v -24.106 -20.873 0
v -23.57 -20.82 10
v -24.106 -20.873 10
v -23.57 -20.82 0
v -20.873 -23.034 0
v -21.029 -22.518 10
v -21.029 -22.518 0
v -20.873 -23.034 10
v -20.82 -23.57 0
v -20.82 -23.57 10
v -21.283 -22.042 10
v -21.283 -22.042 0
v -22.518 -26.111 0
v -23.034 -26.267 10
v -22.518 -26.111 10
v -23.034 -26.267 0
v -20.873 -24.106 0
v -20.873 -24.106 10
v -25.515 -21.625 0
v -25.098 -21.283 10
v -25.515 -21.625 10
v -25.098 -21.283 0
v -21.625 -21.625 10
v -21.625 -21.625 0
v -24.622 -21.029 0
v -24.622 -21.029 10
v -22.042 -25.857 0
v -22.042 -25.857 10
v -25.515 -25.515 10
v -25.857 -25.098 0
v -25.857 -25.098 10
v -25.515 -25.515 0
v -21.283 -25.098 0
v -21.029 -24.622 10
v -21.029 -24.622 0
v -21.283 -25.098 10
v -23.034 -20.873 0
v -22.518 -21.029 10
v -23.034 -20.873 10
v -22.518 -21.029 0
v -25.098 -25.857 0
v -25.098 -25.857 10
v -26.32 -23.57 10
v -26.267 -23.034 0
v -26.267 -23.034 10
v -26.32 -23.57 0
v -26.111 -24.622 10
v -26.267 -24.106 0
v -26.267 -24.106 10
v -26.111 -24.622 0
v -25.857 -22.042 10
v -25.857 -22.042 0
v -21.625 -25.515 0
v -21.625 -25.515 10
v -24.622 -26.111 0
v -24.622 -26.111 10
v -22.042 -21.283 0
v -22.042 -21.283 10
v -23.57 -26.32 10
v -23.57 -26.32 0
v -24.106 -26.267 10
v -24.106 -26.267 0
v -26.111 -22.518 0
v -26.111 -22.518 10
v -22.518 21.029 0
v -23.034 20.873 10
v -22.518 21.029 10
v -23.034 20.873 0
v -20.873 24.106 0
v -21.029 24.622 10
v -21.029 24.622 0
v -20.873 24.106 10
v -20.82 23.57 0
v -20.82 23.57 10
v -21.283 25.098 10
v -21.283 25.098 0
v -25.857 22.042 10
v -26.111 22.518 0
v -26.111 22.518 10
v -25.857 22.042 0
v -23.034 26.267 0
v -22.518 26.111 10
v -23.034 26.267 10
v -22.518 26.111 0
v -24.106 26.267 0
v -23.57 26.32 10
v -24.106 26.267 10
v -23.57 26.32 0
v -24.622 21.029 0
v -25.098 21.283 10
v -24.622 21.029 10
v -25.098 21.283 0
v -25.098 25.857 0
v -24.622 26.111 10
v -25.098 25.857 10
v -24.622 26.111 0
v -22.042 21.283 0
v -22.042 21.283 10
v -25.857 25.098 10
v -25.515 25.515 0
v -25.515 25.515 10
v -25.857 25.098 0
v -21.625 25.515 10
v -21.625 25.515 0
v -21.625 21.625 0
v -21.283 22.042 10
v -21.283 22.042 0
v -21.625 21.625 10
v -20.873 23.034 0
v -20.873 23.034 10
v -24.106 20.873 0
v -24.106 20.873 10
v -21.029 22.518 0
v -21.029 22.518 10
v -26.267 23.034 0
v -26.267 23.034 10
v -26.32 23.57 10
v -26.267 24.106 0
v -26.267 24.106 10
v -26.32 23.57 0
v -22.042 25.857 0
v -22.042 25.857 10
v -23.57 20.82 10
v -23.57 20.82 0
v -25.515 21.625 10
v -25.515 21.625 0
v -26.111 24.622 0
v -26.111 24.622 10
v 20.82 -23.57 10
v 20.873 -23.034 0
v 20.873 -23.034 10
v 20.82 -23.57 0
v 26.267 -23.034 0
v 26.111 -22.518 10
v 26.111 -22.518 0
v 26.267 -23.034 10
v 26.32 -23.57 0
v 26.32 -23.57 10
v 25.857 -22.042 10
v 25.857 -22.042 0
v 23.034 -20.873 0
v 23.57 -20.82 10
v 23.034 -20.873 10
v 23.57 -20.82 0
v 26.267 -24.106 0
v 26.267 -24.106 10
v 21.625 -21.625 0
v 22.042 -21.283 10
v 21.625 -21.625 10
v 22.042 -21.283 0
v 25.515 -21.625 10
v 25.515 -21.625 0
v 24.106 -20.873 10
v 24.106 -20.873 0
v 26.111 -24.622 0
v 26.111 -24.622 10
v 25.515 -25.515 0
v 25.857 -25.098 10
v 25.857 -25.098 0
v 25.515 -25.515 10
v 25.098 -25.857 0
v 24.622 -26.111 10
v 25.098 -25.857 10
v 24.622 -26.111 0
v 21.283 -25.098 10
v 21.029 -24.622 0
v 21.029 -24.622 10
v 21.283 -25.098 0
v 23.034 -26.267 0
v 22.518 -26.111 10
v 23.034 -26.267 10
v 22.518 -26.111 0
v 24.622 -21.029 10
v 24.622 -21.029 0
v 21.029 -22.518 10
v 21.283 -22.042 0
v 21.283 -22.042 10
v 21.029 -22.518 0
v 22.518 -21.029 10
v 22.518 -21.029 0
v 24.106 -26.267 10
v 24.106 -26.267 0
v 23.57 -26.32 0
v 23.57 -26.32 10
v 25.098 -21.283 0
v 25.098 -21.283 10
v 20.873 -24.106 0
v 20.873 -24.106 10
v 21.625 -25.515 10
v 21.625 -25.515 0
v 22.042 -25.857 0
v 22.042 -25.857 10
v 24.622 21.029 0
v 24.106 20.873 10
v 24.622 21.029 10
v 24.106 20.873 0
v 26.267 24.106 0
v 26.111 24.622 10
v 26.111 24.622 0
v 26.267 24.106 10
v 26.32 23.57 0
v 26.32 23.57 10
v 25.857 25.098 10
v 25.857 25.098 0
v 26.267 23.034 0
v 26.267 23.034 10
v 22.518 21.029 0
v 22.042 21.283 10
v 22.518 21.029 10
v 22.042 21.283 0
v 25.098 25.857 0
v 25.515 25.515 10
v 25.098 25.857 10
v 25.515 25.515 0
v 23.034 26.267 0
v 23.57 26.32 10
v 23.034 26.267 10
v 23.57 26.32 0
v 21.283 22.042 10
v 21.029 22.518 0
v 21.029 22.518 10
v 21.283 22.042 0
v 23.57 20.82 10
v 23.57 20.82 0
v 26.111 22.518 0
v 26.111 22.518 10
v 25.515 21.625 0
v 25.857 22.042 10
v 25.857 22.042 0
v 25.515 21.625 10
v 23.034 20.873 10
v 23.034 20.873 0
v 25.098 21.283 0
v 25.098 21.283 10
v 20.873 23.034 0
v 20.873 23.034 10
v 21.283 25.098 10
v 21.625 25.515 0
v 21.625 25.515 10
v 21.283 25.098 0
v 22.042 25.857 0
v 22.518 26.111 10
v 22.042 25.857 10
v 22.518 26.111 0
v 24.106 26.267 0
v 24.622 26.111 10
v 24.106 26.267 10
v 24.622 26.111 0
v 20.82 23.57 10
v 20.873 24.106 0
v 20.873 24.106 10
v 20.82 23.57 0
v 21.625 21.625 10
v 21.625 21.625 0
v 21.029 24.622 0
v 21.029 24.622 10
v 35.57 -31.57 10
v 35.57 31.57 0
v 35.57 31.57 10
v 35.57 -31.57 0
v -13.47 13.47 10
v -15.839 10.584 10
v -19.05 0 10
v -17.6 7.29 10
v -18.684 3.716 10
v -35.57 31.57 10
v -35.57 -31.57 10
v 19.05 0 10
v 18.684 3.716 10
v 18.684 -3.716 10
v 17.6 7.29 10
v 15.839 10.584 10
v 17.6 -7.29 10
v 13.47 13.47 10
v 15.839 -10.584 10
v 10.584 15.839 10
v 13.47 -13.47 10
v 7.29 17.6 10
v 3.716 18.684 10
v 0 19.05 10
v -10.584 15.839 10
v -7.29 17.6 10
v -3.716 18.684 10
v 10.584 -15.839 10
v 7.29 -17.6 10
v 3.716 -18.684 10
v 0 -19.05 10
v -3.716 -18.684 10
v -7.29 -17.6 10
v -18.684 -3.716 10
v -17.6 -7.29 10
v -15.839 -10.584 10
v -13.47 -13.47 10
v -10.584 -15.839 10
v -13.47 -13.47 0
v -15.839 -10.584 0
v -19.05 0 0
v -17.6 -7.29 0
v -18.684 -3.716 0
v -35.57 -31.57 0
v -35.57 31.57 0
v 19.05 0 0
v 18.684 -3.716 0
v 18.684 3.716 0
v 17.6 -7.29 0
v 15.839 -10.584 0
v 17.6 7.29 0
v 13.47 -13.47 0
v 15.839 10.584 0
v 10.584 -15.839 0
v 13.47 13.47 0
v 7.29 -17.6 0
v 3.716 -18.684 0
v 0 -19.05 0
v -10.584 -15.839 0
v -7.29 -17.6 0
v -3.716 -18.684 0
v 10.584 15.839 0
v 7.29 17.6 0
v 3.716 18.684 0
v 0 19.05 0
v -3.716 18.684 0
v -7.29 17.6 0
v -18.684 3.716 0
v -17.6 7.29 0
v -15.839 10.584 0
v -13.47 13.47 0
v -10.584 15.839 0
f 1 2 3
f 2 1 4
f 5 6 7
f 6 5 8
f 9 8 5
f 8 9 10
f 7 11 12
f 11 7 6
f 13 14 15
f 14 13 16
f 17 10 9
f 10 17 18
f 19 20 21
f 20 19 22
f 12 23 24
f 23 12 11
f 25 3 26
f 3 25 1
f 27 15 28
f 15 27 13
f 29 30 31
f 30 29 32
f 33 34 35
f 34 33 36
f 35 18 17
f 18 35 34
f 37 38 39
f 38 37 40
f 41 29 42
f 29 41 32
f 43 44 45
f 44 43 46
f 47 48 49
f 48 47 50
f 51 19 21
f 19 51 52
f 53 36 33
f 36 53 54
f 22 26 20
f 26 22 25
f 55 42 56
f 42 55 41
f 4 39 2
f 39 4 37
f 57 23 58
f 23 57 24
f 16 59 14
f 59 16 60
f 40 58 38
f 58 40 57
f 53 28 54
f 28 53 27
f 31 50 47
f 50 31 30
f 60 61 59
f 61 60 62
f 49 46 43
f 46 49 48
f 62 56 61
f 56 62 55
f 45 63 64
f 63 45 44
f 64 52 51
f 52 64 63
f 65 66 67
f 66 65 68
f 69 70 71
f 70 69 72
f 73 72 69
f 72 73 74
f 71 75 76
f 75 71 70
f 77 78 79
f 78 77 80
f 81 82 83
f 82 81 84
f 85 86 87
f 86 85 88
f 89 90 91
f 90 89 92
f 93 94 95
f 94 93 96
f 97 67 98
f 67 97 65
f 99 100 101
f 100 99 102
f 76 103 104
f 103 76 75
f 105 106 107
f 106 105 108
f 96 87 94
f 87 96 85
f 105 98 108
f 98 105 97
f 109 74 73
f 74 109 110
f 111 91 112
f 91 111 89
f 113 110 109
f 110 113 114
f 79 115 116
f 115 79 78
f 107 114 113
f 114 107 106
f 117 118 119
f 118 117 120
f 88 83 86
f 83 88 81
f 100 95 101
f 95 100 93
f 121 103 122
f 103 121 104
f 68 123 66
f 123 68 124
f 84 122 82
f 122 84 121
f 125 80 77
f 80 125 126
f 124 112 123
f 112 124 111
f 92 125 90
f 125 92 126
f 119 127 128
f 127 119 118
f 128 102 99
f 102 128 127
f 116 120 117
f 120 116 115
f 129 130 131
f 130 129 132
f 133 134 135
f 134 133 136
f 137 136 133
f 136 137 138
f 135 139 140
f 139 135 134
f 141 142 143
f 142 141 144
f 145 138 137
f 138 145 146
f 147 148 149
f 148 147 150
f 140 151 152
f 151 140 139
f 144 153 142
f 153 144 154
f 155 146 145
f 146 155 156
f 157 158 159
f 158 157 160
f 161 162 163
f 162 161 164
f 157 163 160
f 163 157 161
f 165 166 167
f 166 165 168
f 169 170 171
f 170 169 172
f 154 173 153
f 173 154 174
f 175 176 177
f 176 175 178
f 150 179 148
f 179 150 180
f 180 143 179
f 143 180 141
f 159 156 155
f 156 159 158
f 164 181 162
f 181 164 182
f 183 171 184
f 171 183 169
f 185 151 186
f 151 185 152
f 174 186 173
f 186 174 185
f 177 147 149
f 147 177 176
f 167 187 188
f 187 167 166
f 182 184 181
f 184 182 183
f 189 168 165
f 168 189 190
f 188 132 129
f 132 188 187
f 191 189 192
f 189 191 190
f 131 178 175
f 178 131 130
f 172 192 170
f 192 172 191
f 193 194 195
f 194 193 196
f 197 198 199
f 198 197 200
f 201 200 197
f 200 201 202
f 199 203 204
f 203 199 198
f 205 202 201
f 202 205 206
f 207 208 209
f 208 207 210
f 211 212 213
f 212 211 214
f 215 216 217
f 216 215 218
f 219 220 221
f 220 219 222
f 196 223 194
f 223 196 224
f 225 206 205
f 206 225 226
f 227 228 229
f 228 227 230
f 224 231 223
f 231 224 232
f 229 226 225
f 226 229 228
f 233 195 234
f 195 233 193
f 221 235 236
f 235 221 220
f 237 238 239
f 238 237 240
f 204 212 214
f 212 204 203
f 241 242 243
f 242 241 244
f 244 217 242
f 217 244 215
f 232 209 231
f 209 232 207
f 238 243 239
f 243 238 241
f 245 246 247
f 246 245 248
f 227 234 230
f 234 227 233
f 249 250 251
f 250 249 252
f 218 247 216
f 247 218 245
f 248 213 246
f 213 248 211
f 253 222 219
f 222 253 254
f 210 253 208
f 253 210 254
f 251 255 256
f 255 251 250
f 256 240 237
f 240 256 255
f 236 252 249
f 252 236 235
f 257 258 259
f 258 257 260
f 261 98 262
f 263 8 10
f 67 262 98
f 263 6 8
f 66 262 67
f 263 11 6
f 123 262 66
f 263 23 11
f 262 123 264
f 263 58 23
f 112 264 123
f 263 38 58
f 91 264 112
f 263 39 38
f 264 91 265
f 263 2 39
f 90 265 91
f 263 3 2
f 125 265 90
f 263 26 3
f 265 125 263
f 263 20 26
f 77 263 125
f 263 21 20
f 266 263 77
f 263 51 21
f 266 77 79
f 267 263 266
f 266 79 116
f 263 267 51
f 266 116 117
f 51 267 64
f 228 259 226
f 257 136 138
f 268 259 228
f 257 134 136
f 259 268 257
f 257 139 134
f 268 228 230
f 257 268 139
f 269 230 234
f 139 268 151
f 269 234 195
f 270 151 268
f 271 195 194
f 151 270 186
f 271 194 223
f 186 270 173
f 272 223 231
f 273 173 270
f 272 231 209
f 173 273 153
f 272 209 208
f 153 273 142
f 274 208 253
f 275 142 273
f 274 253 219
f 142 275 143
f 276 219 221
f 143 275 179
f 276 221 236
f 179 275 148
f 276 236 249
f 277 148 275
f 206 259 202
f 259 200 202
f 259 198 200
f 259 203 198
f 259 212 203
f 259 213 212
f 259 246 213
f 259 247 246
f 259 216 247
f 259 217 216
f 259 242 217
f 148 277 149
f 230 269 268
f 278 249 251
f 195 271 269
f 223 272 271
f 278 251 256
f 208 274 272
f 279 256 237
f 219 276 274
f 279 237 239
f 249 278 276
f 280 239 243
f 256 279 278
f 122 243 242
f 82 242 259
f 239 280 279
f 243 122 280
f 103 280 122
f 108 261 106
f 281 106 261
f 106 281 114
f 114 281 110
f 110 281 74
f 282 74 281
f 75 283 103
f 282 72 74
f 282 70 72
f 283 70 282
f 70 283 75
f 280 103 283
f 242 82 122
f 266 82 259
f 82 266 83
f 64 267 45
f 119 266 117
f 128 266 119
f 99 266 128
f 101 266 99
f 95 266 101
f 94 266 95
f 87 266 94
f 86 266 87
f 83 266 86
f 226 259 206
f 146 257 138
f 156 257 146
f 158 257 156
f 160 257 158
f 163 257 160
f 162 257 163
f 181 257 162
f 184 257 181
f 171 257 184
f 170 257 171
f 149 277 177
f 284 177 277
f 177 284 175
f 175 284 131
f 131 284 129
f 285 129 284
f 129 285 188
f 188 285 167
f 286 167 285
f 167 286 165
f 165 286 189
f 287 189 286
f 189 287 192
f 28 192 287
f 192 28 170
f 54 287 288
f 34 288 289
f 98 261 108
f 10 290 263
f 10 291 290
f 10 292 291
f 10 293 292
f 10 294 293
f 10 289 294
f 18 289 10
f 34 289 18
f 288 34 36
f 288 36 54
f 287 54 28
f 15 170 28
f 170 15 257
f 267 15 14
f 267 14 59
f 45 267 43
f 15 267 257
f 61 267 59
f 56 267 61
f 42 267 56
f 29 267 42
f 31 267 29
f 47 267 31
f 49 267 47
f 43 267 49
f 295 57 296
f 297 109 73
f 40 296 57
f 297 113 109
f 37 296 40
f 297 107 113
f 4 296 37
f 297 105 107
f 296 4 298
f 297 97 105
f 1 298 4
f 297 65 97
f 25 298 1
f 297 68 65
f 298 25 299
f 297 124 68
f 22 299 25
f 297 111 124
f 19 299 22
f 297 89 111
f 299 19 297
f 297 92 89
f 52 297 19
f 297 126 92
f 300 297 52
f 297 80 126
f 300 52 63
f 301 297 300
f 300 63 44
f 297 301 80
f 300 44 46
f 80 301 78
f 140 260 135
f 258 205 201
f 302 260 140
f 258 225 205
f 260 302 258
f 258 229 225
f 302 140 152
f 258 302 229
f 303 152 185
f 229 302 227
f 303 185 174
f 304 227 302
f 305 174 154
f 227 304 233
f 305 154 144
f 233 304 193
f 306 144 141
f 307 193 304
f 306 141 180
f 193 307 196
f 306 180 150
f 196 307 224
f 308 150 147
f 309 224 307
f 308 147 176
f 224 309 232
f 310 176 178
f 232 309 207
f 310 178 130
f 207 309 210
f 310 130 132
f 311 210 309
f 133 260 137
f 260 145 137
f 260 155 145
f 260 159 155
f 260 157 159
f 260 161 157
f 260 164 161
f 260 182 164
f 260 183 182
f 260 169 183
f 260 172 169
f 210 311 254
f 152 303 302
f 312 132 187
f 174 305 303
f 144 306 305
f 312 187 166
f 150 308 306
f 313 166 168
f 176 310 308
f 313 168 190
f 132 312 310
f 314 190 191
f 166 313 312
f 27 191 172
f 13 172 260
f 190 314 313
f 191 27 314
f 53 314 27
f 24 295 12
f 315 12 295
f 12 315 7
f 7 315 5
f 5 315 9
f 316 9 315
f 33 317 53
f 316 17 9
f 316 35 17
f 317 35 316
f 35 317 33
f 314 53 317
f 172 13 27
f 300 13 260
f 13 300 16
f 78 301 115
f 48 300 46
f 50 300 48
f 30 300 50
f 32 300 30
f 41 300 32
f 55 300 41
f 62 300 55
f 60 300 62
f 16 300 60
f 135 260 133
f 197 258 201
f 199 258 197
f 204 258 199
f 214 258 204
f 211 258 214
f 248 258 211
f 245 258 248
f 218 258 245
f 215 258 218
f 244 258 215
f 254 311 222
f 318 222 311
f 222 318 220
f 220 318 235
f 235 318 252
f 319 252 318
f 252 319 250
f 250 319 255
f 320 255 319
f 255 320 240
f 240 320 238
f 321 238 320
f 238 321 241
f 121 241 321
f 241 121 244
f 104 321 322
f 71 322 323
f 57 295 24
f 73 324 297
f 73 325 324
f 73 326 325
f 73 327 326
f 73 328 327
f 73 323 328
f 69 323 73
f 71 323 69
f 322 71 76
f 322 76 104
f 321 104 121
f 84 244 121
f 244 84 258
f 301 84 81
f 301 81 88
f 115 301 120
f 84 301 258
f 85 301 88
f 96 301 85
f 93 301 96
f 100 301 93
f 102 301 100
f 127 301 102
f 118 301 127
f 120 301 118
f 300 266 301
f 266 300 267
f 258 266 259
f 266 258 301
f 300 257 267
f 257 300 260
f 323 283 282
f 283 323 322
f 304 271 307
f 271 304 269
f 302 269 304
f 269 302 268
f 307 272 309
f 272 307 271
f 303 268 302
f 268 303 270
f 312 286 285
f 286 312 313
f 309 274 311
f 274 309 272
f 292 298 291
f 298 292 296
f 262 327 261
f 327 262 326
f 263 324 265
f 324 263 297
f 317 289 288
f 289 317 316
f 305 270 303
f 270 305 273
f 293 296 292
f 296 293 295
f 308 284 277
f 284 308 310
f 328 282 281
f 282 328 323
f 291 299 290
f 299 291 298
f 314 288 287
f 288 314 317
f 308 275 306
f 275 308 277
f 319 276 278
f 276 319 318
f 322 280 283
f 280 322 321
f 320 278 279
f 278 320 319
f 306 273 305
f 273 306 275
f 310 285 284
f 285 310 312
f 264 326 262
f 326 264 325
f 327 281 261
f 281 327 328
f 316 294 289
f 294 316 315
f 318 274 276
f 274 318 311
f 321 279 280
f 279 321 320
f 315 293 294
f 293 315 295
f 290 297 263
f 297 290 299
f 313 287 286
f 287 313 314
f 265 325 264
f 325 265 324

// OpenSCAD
$fn = 32;

// ----------------------------------------------------------------------
// Motor mount plate: NEMA23, 71.14 x 63.14 x 10 mm
// ----------------------------------------------------------------------

// --- parameters (mm) ---
mount_w = 71.14;          // plate length, X
mount_d = 63.14;          // plate width, Y
mat_t = 10;               // plate thickness
motor_pitch = 47.14;      // NEMA23 bolt spacing
motor_d = 5.5;            // NEMA23 screw clearance
center_bore = 38.1;       // pilot boss bore

module plate() {
  translate([-mount_w / 2, -mount_d / 2, 0]) cube([mount_w, mount_d, mat_t]);
}

module motor_holes() {
  for (sx = [-1, 1]) for (sy = [-1, 1])
    translate([sx * motor_pitch / 2, sy * motor_pitch / 2, -1])
      cylinder(h = mat_t + 2, d = motor_d);
}

difference() {
  union() {
    plate();
  }
  motor_holes();
  translate([0, 0, -1]) cylinder(h = mat_t + 2, d = center_bore);
}
